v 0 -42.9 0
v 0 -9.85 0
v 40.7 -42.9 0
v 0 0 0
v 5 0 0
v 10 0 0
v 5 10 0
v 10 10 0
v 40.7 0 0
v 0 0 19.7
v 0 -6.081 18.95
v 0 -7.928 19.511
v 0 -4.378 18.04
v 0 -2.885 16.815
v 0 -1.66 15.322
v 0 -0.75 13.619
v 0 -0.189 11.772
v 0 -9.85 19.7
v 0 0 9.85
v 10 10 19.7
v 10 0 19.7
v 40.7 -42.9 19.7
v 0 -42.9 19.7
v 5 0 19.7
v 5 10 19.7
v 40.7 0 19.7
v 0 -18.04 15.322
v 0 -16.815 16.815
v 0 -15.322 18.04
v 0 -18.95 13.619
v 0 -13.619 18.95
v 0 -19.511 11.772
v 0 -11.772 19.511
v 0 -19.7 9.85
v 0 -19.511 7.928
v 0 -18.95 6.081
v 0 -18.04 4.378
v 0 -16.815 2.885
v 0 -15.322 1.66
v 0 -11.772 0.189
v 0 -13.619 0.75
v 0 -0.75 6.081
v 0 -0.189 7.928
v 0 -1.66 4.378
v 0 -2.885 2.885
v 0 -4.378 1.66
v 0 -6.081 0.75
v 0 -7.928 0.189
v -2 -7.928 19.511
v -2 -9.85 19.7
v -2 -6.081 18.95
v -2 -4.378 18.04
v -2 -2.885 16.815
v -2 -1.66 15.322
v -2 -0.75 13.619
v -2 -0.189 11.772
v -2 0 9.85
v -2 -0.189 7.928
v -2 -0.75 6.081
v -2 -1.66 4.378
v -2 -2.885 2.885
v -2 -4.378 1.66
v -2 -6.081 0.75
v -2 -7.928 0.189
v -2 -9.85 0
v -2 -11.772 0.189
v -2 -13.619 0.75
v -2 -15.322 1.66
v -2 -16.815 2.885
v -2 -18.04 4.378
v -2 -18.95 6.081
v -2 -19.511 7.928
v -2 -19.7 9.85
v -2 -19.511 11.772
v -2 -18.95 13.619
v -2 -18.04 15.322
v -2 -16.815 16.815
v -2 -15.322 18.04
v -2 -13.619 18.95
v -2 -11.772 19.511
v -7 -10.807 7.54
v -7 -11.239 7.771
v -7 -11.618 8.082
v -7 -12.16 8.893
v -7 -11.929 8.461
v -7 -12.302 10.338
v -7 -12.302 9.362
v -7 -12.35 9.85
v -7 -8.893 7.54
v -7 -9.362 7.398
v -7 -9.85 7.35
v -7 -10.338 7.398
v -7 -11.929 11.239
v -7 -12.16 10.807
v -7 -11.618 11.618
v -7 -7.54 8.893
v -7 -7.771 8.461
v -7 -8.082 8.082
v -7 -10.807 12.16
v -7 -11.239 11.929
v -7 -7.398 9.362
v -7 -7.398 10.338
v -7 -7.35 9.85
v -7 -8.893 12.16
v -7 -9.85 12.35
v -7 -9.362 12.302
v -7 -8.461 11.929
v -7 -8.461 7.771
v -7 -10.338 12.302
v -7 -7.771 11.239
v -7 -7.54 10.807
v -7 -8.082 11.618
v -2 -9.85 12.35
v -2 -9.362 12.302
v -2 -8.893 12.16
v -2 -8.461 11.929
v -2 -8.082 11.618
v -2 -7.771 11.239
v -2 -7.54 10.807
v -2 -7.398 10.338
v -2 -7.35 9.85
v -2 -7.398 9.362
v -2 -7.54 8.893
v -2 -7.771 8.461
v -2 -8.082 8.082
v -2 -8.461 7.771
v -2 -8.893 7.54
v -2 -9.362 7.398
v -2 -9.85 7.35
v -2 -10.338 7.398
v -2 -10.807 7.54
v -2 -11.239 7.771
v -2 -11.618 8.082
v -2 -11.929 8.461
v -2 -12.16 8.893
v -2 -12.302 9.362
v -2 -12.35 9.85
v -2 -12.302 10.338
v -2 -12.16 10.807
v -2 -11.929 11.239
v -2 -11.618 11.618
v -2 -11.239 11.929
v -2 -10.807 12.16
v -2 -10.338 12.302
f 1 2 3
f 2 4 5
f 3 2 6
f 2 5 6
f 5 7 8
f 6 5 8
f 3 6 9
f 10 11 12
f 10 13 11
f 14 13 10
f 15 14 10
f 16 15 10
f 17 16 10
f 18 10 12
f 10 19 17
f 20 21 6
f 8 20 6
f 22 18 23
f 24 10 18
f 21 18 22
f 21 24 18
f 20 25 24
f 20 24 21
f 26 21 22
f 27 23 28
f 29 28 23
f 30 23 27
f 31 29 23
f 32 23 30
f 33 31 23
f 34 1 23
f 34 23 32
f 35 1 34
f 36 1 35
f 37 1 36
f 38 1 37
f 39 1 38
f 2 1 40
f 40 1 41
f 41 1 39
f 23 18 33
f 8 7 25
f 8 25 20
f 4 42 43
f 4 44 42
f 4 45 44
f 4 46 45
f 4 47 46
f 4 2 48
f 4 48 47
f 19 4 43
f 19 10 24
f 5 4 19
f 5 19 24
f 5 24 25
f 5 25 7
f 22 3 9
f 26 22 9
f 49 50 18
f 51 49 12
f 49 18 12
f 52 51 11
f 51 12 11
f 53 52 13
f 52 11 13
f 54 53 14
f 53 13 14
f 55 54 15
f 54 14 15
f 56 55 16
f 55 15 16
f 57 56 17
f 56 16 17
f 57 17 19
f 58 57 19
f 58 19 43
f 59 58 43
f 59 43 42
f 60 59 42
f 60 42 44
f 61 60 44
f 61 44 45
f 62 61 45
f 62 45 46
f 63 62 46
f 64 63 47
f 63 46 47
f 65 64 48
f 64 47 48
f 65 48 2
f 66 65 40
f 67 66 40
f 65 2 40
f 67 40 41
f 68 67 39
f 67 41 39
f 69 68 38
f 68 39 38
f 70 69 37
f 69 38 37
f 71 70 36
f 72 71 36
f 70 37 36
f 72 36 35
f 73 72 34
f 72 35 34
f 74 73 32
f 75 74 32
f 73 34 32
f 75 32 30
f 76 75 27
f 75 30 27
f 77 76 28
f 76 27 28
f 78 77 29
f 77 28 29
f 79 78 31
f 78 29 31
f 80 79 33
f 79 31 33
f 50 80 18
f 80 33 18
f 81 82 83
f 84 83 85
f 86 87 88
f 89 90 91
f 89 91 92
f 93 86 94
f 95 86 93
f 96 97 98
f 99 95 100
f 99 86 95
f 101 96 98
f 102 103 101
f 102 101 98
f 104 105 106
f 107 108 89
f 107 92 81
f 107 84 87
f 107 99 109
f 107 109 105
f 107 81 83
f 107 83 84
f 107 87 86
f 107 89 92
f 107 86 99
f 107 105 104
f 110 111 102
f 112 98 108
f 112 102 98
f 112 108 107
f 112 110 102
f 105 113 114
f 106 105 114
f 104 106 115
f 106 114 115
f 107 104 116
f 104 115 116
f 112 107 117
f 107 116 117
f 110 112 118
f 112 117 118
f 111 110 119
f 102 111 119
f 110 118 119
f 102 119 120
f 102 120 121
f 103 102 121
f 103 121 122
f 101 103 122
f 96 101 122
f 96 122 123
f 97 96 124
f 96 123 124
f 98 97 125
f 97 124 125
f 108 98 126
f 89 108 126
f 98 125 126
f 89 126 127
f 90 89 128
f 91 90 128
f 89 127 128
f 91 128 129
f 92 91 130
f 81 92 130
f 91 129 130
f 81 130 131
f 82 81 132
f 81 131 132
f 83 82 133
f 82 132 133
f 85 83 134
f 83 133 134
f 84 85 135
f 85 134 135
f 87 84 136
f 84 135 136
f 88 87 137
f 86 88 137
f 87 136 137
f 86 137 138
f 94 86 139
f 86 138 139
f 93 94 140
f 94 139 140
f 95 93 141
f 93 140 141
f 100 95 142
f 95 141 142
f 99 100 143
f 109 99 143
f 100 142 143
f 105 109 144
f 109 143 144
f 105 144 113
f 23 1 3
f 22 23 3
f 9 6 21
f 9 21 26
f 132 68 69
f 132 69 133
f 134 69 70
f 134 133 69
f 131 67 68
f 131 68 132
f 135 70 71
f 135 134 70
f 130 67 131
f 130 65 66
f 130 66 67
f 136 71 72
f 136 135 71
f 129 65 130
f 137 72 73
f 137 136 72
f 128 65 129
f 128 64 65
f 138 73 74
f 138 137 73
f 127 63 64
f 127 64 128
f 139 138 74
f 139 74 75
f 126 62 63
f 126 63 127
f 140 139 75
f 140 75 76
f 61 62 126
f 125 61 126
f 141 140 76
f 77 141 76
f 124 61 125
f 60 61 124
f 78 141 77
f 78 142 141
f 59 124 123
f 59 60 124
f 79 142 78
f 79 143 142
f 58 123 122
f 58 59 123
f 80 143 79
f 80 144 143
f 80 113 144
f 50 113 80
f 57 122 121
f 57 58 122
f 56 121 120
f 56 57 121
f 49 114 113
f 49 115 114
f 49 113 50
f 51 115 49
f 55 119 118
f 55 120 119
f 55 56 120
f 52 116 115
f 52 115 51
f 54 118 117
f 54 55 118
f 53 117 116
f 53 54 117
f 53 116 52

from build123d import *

# Parameters (mm, degrees)
SKETCH_1_W      = 40.7
SKETCH_1_H      = 42.9
EXTRUDE_1_DEPTH = 19.7
SKETCH_2_W      = 5
SKETCH_2_H      = 19.7
EXTRUDE_2_DEPTH = 10
SKETCH_3_R      = 9.85
EXTRUDE_3_DEPTH = 2
SKETCH_4_R      = 2.5
EXTRUDE_4_DEPTH = 5


with BuildPart() as part:
    # 草圖1 → 填料-伸長1 (new body)
    with BuildSketch(Plane.XY):
        with Locations((20.35, -21.45)):
            Rectangle(SKETCH_1_W, SKETCH_1_H)
    extrude(amount=EXTRUDE_1_DEPTH)

    # 草圖2 → 填料-伸長2 (add)
    with BuildSketch(Plane(origin=(0, 0, 0), x_dir=(1, 0, 0), z_dir=(0, 1, 0))):
        with Locations((7.5, -9.85)):
            Rectangle(SKETCH_2_W, SKETCH_2_H)
    extrude(amount=EXTRUDE_2_DEPTH)

    # 草圖3 → 填料-伸長3 (add)
    with BuildSketch(Plane.ZY):
        with Locations((9.85, -9.85)):
            Circle(SKETCH_3_R)
    extrude(amount=EXTRUDE_3_DEPTH)

    # 草圖4 → 填料-伸長4 (add)
    with BuildSketch(Plane.ZY.offset(2)):
        with Locations((9.85, -9.85)):
            Circle(SKETCH_4_R)
    extrude(amount=EXTRUDE_4_DEPTH)


solid = part.part
